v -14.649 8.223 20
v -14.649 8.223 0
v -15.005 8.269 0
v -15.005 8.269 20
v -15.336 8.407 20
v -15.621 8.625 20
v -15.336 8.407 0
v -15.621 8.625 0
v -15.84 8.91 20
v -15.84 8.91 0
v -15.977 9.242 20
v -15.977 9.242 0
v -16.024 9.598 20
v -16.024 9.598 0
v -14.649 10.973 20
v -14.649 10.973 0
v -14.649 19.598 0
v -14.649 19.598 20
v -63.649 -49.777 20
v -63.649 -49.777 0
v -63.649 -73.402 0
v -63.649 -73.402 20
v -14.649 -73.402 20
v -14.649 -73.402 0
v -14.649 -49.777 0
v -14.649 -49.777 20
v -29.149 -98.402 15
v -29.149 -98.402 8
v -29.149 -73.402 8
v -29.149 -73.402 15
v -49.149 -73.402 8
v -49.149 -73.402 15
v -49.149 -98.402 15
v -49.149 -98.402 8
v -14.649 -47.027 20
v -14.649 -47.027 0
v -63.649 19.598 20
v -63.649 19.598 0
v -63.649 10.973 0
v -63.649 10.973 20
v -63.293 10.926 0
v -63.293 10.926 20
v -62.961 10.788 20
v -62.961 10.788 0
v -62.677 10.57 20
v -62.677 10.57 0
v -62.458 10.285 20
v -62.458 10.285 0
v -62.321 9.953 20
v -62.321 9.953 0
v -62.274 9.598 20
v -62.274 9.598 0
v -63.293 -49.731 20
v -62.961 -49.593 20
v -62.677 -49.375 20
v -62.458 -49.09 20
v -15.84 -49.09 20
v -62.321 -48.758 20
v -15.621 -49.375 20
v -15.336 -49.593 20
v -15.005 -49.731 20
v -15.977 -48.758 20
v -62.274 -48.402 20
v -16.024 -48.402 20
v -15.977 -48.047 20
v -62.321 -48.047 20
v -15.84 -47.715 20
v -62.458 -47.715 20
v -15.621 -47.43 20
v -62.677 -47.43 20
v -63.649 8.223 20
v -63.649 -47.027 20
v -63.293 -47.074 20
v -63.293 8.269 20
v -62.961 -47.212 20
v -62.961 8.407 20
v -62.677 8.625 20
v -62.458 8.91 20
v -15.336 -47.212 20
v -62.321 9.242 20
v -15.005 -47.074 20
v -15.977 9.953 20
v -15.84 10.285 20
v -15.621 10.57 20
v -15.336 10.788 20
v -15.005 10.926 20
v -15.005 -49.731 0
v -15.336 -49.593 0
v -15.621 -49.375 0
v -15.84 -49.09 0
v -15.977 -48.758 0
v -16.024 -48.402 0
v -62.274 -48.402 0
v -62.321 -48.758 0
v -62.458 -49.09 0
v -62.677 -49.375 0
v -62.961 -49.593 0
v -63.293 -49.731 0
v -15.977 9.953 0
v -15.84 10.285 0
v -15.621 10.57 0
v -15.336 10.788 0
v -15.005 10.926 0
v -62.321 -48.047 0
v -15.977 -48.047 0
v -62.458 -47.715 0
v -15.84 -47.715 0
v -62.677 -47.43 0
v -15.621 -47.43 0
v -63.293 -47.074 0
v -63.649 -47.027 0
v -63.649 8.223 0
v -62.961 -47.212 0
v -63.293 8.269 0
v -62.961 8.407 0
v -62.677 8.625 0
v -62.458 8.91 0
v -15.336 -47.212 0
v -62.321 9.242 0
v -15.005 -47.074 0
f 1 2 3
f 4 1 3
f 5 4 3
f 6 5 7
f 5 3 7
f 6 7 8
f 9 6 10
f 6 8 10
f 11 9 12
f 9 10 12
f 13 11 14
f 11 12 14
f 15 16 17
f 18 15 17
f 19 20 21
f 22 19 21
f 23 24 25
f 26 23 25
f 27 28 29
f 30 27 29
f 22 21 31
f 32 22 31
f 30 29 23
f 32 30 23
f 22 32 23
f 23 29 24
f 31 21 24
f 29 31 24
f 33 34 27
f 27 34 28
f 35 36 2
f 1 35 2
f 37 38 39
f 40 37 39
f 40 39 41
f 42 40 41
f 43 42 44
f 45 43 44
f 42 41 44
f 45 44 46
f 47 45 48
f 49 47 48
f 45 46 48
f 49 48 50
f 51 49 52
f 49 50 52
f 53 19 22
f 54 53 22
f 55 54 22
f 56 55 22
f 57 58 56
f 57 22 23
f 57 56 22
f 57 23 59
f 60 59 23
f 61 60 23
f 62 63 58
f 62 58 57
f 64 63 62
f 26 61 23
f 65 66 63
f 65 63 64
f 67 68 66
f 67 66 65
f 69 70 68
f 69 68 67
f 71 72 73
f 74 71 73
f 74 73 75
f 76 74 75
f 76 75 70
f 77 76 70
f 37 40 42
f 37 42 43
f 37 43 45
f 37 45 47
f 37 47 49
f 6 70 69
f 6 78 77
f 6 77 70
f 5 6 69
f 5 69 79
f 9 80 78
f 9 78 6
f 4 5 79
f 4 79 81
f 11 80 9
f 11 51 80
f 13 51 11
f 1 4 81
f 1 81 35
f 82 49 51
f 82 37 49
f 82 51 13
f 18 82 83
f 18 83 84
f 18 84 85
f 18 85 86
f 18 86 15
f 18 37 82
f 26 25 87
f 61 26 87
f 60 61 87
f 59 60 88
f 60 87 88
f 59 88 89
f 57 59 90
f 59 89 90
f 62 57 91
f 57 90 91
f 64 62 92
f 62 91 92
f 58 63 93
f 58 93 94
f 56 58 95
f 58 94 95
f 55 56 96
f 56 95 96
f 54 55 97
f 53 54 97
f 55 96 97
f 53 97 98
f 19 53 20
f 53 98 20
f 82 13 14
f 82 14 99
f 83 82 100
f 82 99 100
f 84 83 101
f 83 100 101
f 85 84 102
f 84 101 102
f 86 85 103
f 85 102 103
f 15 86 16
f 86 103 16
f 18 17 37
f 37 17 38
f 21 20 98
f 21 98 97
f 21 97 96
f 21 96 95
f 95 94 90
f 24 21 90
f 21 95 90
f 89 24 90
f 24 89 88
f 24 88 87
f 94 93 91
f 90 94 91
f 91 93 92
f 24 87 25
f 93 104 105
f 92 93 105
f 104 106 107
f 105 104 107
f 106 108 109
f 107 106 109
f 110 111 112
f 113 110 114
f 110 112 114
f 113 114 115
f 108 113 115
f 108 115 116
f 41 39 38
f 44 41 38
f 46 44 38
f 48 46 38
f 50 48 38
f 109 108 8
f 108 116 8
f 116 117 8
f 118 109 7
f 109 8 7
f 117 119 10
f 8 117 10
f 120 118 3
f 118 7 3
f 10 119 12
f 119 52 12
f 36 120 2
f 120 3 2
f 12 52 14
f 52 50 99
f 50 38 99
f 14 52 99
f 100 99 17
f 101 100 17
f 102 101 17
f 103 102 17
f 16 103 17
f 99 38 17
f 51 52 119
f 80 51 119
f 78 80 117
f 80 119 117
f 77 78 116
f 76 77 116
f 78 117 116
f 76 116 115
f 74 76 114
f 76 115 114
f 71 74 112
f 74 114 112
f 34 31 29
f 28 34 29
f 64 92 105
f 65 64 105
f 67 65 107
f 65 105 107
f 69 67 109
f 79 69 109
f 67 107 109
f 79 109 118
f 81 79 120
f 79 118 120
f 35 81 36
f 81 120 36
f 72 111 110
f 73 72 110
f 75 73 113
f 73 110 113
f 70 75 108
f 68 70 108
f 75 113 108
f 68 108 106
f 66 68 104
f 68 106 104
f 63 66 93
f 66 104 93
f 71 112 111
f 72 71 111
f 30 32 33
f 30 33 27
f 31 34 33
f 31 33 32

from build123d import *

# Parameters (mm, degrees)
F1_DEPTH = 20
F0_W     = 20
F0_H     = 25
F2_DEPTH = 15
F3_DEPTH = 8


with BuildPart() as f1:
    # F0 (on Top) → F1 (new body)
    with BuildSketch(Plane.XY):
        with BuildLine():
            Line((-14.6488370299, -47.0274474025), (-14.6488370299, 8.2225525975))
            ThreePointArc((-14.6488370299, 8.2225525975), (-15.6211088541, 8.6252807734), (-16.0238370299, 9.5975525975))
            Line((-16.0238370299, 9.5975525975), (-62.2738370299, 9.5975525975))
            ThreePointArc((-62.2738370299, 9.5975525975), (-62.6765652058, 8.6252807734), (-63.6488370299, 8.2225525975))
            Line((-63.6488370299, 8.2225525975), (-63.6488370299, -47.0274474025))
            ThreePointArc((-63.6488370299, -47.0274474025), (-62.6765652058, -47.4301755783), (-62.2738370299, -48.4024474025))
            Line((-62.2738370299, -48.4024474025), (-16.0238370299, -48.4024474025))
            ThreePointArc((-16.0238370299, -48.4024474025), (-15.6211088541, -47.4301755783), (-14.6488370299, -47.0274474025))
        make_face()
        with BuildLine():
            ThreePointArc((-16.0238370299, 9.5975525975), (-15.6211088541, 10.5698244217), (-14.6488370299, 10.9725525975))
            Line((-14.6488370299, 10.9725525975), (-14.6488370299, 19.5975525975))
            Line((-14.6488370299, 19.5975525975), (-63.6488370299, 19.5975525975))
            Line((-63.6488370299, 19.5975525975), (-63.6488370299, 10.9725525975))
            ThreePointArc((-63.6488370299, 10.9725525975), (-62.6765652058, 10.5698244217), (-62.2738370299, 9.5975525975))
            Line((-62.2738370299, 9.5975525975), (-16.0238370299, 9.5975525975))
        make_face()
        with BuildLine():
            ThreePointArc((-14.6488370299, -49.7774474025), (-15.6211088541, -49.3747192266), (-16.0238370299, -48.4024474025))
            Line((-16.0238370299, -48.4024474025), (-62.2738370299, -48.4024474025))
            ThreePointArc((-62.2738370299, -48.4024474025), (-62.6765652058, -49.3747192266), (-63.6488370299, -49.7774474025))
            Line((-63.6488370299, -49.7774474025), (-63.6488370299, -73.4024474025))
            Line((-63.6488370299, -73.4024474025), (-49.1488370299, -73.4024474025))
            Line((-49.1488370299, -73.4024474025), (-29.1488370299, -73.4024474025))
            Line((-29.1488370299, -73.4024474025), (-14.6488370299, -73.4024474025))
            Line((-14.6488370299, -73.4024474025), (-14.6488370299, -49.7774474025))
        make_face()
    extrude(amount=F1_DEPTH)

    # F0 (on Top) → F2 (join)
    with BuildSketch(Plane.XY):
        with Locations((-39.1488370299, -85.9024474025)):
            Rectangle(F0_W, F0_H)
    extrude(amount=F2_DEPTH)

    # F0 (on Top) → F3 (cut)
    with BuildSketch(Plane.XY):
        with Locations((-39.1488370299, -85.9024474025)):
            Rectangle(F0_W, F0_H)
    extrude(amount=F3_DEPTH, mode=Mode.SUBTRACT)


solid = f1.part
